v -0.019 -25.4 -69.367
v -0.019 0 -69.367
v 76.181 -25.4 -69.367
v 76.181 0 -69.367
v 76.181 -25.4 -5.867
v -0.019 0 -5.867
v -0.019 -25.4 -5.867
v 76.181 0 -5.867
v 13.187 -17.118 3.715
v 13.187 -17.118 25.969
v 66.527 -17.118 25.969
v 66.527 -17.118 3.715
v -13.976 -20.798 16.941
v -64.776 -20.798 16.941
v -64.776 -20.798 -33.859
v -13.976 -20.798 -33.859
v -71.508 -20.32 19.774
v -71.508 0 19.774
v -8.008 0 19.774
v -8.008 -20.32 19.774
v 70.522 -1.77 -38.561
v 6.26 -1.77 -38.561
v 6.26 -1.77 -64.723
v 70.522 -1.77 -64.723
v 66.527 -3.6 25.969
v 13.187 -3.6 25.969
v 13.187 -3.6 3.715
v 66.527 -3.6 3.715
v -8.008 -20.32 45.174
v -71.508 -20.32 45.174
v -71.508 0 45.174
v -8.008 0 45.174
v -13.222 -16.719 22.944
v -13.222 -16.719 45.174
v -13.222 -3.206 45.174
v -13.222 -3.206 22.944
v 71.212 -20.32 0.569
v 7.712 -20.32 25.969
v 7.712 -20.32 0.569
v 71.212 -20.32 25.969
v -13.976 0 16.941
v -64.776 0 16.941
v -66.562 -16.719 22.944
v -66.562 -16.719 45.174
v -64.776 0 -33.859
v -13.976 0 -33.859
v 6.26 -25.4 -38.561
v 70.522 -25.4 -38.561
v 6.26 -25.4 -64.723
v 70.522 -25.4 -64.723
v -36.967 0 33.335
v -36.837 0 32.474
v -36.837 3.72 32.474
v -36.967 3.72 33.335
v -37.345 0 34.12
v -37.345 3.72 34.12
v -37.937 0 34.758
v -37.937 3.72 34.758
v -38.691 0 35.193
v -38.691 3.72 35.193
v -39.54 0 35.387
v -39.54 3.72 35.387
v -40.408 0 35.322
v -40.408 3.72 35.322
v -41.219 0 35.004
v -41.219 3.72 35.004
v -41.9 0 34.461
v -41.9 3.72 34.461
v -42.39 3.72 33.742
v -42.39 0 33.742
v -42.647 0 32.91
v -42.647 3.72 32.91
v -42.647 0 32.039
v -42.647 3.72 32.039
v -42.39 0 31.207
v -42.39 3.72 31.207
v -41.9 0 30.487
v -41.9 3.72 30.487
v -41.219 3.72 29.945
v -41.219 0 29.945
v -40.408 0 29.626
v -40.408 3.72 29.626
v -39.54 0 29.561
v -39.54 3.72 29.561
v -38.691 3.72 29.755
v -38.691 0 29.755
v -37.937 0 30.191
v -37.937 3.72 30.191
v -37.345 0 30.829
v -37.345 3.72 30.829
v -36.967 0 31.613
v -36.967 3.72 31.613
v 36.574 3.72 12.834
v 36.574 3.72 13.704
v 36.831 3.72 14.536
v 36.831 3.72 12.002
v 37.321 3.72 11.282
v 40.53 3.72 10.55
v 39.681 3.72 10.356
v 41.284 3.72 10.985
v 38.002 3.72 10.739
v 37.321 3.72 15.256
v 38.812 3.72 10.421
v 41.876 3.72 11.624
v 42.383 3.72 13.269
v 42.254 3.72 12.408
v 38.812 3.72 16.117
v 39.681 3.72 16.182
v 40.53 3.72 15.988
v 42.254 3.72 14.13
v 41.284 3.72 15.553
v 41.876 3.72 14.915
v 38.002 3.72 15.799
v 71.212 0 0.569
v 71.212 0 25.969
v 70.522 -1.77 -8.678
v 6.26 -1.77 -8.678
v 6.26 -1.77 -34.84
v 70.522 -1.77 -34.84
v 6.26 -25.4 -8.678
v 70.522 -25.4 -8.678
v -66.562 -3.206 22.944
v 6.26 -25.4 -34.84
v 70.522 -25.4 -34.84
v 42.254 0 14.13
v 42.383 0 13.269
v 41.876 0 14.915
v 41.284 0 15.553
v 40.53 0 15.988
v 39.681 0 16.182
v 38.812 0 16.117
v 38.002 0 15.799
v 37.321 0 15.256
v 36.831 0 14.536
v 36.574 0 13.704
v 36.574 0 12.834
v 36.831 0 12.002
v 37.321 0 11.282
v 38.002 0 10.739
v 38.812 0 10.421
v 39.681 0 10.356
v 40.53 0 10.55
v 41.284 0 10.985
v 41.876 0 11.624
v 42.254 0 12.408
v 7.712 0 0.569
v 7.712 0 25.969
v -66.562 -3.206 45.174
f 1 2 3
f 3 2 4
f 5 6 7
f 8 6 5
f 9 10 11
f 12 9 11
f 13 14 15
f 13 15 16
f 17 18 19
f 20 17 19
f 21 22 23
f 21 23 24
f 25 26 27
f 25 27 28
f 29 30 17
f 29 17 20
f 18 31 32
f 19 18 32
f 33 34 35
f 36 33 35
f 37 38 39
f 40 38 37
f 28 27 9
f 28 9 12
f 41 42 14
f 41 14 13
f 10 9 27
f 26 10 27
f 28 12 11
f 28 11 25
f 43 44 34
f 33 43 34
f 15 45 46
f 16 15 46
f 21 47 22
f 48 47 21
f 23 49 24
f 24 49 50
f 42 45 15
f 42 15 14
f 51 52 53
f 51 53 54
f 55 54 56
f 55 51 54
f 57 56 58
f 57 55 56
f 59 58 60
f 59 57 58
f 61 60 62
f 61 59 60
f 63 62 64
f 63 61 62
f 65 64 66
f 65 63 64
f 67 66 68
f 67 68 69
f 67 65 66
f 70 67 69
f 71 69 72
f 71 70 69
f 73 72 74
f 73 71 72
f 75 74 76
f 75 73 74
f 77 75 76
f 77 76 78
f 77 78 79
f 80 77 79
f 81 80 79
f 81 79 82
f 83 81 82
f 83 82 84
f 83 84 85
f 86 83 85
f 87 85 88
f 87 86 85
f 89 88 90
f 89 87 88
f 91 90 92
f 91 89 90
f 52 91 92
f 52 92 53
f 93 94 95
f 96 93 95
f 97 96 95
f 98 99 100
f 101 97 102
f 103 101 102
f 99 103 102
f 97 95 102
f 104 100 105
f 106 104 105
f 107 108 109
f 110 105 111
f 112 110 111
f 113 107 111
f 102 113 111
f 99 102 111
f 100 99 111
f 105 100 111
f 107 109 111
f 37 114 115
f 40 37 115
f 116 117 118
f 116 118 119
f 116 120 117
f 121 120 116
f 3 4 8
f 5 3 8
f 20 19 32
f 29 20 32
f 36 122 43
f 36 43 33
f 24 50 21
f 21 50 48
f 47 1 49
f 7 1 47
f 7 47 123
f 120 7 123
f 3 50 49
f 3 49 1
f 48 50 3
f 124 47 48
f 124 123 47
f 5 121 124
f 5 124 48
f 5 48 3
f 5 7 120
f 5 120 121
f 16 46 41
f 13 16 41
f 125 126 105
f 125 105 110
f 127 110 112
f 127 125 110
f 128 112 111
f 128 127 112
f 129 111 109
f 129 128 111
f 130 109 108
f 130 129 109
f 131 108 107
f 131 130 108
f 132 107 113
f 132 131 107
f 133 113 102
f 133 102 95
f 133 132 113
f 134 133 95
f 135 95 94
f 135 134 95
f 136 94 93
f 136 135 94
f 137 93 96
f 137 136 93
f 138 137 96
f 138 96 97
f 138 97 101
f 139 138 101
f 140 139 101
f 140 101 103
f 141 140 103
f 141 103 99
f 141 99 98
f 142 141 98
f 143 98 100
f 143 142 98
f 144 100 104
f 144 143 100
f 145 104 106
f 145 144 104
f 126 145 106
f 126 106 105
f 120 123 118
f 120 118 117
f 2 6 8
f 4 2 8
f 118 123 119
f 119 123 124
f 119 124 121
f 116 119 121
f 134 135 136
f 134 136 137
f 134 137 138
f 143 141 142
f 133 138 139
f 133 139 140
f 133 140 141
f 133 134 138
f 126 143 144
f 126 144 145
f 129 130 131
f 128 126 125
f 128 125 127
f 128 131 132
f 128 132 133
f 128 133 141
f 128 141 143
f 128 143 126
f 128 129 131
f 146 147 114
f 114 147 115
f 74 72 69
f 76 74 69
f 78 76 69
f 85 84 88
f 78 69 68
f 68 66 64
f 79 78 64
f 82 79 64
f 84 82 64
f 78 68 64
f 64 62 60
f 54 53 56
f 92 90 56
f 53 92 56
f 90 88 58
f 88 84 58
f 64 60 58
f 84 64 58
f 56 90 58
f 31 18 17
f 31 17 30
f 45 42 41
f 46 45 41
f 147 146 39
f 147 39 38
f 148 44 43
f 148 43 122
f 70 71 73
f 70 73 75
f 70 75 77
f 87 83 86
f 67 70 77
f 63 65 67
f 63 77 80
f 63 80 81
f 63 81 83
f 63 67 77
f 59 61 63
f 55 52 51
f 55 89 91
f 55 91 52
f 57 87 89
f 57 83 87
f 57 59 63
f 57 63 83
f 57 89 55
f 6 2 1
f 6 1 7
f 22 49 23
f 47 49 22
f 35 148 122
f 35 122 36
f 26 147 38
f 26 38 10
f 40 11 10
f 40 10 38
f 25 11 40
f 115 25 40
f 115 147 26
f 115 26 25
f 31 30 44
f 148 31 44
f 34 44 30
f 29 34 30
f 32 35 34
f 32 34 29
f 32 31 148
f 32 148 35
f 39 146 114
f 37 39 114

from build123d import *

# Parameters (mm, degrees)
F0_W      = 50.8
F0_H      = 50.8
F1_DEPTH  = 20.79838
F2_W      = 76.2
F2_H      = 63.5
F3_DEPTH  = 25.4
F4_W      = 64.262
F4_H      = 26.162
F5_DEPTH  = 23.62987
F6_W      = 63.5
F6_H      = 25.4
F7_DEPTH  = 20.32
F8_W      = 63.5
F8_H      = 25.4
F9_DEPTH  = 20.32
F10_R     = 2.921
F11_DEPTH = 3.71992
F12_W     = 53.34
F12_H     = 13.517677
F13_DEPTH = 22.25425
F14_W     = 53.34
F14_H     = 13.5128
F15_DEPTH = 22.23022


with BuildPart() as f1:
    # F0 (on Front) → F1 (new body)
    with BuildSketch(Plane.XZ):
        with Locations((-39.375696, -8.458808)):
            Rectangle(F0_W, F0_H)
    extrude(amount=F1_DEPTH)


with BuildPart() as f3:
    # F2 (on Front) → F3 (new body)
    with BuildSketch(Plane.XZ):
        with Locations((38.081209, -37.617004)):
            Rectangle(F2_W, F2_H)
    extrude(amount=F3_DEPTH)

    # F4 (on face) → F5 (cut)
    with BuildSketch(Plane.XZ.offset(25.4)):
        with Locations((38.390803, -21.75927)):
            Rectangle(F4_W, F4_H)
        with Locations((38.390803, -51.641623)):
            Rectangle(F4_W, F4_H)
    extrude(amount=-F5_DEPTH, mode=Mode.SUBTRACT)


with BuildPart() as f7:
    # F6 (on Front) → F7 (new body)
    with BuildSketch(Plane.XZ):
        with Locations((39.462394, 13.269082)):
            Rectangle(F6_W, F6_H)
    extrude(amount=F7_DEPTH)

    # F12 (on face) → F13 (cut)
    with BuildSketch(Plane.XY.offset(25.969082)):
        with Locations((39.857018, -10.358874)):
            Rectangle(F12_W, F12_H)
    extrude(amount=-F13_DEPTH, mode=Mode.SUBTRACT)


with BuildPart() as f9:
    # F8 (on Front) → F9 (new body)
    with BuildSketch(Plane.XZ):
        with Locations((-39.758361, 32.474239)):
            Rectangle(F8_W, F8_H)
    extrude(amount=F9_DEPTH)

    # F14 (on face) → F15 (cut)
    with BuildSketch(Plane.XY.offset(45.174239)):
        with Locations((-39.892271, -9.96269)):
            Rectangle(F14_W, F14_H)
    extrude(amount=-F15_DEPTH, mode=Mode.SUBTRACT)


with BuildPart() as f11:
    # F10 (on Front) → F11 (new body)
    with BuildSketch(Plane.XZ):
        with Locations((39.462394, 13.269082)):
            Circle(F10_R)
        with Locations((-39.758361, 32.474239)):
            Circle(F10_R)
    extrude(amount=-F11_DEPTH)


solid = Compound([f1.part, f3.part, f7.part, f9.part, f11.part])
